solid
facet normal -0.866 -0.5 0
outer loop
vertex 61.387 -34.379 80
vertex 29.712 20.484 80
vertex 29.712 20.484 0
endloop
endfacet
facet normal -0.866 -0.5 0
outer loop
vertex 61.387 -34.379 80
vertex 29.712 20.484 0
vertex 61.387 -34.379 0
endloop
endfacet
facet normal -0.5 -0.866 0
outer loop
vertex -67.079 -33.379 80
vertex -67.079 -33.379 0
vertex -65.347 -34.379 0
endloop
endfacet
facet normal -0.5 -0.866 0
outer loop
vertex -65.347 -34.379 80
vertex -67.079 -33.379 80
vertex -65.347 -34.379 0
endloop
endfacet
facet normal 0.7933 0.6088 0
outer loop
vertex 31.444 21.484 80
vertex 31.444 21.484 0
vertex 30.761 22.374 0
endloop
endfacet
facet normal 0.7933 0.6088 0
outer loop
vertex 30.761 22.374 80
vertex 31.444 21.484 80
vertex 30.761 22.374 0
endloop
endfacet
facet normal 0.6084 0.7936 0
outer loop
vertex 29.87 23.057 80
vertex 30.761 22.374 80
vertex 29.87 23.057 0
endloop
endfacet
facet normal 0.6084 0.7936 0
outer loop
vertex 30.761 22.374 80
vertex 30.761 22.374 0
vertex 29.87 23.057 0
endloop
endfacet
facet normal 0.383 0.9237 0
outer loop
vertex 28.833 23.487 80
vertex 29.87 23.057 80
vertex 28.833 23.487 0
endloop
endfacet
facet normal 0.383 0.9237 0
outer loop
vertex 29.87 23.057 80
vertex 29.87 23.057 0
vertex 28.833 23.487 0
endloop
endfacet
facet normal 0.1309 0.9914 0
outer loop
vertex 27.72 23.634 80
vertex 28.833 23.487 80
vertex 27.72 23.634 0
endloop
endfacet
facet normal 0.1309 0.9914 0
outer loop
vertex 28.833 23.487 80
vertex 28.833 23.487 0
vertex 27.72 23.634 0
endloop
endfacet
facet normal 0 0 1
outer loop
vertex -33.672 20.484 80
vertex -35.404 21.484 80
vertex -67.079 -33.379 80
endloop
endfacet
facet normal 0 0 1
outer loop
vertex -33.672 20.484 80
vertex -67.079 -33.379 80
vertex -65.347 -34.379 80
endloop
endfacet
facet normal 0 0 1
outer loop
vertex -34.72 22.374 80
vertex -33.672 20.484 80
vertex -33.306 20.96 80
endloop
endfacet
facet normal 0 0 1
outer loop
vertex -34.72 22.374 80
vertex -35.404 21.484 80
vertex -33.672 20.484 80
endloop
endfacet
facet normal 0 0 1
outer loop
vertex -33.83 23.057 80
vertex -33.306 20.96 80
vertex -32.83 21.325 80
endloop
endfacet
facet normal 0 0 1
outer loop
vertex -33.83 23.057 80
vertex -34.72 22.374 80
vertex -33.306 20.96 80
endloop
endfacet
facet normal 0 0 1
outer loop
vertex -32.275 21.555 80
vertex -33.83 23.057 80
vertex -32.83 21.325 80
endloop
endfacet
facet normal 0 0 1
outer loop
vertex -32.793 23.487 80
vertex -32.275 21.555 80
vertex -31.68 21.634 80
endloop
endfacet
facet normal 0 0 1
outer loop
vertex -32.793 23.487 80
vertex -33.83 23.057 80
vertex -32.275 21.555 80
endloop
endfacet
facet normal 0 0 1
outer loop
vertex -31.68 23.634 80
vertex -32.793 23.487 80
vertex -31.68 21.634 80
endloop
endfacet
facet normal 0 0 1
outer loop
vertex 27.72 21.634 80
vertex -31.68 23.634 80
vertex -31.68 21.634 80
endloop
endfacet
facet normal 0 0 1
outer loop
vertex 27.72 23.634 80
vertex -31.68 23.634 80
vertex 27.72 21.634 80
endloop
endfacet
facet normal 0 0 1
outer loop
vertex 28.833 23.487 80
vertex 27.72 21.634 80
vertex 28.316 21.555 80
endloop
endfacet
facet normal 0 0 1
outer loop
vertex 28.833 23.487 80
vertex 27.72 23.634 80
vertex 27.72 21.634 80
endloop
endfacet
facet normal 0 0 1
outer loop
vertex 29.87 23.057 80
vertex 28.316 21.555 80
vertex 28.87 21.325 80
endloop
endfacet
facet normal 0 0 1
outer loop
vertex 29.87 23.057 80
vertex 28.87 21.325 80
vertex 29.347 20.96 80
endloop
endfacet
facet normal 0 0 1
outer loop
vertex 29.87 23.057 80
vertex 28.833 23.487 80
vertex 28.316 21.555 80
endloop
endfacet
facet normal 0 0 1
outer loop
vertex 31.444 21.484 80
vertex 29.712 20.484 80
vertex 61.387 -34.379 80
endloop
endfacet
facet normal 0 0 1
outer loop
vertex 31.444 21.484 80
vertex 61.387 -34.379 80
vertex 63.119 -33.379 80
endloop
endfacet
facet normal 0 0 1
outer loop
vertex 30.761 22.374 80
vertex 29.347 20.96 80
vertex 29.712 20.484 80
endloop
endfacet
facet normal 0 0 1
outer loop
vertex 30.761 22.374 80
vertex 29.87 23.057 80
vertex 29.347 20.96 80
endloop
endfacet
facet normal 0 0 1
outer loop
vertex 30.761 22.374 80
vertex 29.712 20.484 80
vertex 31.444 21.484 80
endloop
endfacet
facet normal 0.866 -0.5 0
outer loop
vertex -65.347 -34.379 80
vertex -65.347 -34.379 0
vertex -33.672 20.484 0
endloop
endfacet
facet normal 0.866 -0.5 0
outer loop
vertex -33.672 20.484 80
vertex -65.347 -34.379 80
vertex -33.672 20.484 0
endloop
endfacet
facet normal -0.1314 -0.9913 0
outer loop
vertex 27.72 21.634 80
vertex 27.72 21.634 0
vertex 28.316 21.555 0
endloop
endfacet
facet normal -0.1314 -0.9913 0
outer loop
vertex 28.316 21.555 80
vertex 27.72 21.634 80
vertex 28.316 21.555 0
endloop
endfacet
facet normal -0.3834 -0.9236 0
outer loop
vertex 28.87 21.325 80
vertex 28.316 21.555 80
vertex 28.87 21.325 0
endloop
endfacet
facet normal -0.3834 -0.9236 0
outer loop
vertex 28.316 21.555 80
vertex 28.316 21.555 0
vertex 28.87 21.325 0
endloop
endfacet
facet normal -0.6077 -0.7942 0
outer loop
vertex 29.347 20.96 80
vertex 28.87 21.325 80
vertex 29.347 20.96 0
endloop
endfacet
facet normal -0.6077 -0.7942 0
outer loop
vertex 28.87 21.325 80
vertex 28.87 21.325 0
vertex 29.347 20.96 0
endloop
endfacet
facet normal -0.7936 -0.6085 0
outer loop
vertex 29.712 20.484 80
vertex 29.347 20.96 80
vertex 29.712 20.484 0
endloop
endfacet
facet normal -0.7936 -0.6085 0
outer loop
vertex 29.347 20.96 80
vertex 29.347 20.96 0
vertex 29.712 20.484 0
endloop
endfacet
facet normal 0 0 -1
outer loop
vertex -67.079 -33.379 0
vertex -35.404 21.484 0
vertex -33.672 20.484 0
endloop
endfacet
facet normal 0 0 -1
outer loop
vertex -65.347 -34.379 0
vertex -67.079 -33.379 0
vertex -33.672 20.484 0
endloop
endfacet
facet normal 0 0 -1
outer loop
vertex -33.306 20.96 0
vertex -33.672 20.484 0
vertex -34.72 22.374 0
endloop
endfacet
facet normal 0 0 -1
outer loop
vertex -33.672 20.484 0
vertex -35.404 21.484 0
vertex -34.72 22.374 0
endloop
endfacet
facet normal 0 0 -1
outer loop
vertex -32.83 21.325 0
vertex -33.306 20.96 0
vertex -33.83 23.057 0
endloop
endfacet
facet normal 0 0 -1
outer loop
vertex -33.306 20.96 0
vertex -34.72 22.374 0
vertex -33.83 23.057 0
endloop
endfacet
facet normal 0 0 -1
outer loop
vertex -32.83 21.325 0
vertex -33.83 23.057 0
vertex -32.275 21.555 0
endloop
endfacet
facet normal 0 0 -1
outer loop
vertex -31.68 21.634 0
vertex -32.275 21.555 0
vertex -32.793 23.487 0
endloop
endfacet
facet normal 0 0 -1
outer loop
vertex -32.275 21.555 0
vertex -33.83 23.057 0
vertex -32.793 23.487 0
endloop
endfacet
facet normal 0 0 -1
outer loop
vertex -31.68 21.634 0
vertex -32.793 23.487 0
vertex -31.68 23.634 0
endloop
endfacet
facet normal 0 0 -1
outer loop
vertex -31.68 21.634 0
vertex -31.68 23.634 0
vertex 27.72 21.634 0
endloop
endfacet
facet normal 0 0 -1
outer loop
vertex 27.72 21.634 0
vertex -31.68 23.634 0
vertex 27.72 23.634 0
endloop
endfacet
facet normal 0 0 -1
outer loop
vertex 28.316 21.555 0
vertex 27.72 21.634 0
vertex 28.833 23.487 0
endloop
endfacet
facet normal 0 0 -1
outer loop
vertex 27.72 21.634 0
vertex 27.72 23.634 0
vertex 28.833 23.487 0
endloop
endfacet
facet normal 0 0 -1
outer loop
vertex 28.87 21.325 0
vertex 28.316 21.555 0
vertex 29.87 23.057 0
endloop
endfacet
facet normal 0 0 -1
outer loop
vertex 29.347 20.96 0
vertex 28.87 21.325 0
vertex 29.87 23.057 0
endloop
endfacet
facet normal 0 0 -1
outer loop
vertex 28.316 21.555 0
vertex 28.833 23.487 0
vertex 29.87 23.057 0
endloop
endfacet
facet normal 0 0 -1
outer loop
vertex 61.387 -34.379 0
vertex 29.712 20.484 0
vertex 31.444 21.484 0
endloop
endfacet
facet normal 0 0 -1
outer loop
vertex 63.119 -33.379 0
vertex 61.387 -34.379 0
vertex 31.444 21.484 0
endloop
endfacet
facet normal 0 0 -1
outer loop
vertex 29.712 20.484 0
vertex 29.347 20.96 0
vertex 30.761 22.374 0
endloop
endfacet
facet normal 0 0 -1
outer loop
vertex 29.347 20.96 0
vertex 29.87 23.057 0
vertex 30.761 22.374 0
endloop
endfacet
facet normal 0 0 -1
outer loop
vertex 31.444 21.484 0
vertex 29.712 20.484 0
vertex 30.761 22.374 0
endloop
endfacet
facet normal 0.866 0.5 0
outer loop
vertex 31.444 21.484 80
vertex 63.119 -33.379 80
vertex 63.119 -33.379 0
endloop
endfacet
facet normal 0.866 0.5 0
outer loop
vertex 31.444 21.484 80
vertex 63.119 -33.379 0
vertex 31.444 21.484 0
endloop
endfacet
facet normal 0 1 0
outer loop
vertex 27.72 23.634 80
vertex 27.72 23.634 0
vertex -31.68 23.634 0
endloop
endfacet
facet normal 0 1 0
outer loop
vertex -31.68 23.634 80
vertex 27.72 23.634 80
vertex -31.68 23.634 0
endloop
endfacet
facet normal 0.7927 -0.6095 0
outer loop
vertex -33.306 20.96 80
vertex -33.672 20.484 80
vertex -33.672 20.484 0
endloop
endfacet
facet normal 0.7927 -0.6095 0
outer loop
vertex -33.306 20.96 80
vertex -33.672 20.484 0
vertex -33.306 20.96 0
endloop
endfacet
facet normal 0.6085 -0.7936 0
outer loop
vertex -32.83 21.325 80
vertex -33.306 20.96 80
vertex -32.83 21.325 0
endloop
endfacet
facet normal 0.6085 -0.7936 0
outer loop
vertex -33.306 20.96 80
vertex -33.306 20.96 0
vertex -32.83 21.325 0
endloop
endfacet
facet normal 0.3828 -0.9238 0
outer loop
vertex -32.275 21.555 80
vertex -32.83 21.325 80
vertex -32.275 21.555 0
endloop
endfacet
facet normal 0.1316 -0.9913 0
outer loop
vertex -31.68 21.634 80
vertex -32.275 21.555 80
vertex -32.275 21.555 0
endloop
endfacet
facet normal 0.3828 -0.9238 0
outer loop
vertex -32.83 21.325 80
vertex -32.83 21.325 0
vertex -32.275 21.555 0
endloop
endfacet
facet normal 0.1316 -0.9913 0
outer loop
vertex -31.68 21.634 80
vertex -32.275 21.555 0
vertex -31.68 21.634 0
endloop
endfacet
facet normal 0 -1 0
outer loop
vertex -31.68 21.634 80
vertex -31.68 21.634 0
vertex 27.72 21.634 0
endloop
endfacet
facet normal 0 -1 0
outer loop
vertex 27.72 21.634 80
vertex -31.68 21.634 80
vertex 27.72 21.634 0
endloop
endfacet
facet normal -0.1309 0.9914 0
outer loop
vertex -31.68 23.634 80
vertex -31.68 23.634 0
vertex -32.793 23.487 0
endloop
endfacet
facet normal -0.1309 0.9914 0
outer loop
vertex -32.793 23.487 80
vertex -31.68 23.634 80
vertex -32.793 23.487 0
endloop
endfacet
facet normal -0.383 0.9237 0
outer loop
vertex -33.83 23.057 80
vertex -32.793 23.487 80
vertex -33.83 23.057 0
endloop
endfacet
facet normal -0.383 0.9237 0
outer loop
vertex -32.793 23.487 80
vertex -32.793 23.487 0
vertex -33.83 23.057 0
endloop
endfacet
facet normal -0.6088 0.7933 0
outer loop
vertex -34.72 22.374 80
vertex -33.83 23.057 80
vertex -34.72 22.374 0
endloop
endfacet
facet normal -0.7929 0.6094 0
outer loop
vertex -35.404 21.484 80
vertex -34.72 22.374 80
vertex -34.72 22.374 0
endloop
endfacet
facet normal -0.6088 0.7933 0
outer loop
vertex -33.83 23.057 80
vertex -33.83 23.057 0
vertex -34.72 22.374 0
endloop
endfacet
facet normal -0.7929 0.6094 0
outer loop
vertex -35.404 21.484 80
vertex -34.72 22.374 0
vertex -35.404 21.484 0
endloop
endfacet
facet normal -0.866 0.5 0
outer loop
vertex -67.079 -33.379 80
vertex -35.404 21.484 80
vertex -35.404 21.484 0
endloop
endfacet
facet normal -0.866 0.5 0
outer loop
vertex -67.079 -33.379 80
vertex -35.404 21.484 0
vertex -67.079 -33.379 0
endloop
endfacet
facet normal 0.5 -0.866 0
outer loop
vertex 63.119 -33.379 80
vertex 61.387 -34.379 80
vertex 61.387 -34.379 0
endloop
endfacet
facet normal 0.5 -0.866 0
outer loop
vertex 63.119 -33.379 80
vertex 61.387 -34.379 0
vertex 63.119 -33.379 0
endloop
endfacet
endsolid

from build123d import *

# Parameters (mm, degrees)
F1_DEPTH = 80


with BuildPart() as f1:
    # F0 (on Top) → F1 (new body)
    with BuildSketch(Plane.XY):
        with BuildLine():
            ThreePointArc((-33.671542, 20.483526), (-32.829683, 21.325384), (-31.679683, 21.633526))
            Line((-31.679683, 21.633526), (27.720317, 21.633526))
            ThreePointArc((27.720317, 21.633526), (28.870317, 21.325384), (29.712175, 20.483526))
            Line((29.712175, 20.483526), (61.387175, -34.379184))
            Line((61.387175, -34.379184), (63.119226, -33.379184))
            Line((63.119226, -33.379184), (31.444226, 21.483526))
            ThreePointArc((31.444226, 21.483526), (29.870317, 23.057435), (27.720317, 23.633526))
            Line((27.720317, 23.633526), (-31.679683, 23.633526))
            ThreePointArc((-31.679683, 23.633526), (-33.829683, 23.057435), (-35.403592, 21.483526))
            Line((-35.403592, 21.483526), (-67.078592, -33.379184))
            Line((-67.078592, -33.379184), (-65.346542, -34.379184))
            Line((-65.346542, -34.379184), (-33.671542, 20.483526))
        make_face()
    extrude(amount=F1_DEPTH)


solid = f1.part
